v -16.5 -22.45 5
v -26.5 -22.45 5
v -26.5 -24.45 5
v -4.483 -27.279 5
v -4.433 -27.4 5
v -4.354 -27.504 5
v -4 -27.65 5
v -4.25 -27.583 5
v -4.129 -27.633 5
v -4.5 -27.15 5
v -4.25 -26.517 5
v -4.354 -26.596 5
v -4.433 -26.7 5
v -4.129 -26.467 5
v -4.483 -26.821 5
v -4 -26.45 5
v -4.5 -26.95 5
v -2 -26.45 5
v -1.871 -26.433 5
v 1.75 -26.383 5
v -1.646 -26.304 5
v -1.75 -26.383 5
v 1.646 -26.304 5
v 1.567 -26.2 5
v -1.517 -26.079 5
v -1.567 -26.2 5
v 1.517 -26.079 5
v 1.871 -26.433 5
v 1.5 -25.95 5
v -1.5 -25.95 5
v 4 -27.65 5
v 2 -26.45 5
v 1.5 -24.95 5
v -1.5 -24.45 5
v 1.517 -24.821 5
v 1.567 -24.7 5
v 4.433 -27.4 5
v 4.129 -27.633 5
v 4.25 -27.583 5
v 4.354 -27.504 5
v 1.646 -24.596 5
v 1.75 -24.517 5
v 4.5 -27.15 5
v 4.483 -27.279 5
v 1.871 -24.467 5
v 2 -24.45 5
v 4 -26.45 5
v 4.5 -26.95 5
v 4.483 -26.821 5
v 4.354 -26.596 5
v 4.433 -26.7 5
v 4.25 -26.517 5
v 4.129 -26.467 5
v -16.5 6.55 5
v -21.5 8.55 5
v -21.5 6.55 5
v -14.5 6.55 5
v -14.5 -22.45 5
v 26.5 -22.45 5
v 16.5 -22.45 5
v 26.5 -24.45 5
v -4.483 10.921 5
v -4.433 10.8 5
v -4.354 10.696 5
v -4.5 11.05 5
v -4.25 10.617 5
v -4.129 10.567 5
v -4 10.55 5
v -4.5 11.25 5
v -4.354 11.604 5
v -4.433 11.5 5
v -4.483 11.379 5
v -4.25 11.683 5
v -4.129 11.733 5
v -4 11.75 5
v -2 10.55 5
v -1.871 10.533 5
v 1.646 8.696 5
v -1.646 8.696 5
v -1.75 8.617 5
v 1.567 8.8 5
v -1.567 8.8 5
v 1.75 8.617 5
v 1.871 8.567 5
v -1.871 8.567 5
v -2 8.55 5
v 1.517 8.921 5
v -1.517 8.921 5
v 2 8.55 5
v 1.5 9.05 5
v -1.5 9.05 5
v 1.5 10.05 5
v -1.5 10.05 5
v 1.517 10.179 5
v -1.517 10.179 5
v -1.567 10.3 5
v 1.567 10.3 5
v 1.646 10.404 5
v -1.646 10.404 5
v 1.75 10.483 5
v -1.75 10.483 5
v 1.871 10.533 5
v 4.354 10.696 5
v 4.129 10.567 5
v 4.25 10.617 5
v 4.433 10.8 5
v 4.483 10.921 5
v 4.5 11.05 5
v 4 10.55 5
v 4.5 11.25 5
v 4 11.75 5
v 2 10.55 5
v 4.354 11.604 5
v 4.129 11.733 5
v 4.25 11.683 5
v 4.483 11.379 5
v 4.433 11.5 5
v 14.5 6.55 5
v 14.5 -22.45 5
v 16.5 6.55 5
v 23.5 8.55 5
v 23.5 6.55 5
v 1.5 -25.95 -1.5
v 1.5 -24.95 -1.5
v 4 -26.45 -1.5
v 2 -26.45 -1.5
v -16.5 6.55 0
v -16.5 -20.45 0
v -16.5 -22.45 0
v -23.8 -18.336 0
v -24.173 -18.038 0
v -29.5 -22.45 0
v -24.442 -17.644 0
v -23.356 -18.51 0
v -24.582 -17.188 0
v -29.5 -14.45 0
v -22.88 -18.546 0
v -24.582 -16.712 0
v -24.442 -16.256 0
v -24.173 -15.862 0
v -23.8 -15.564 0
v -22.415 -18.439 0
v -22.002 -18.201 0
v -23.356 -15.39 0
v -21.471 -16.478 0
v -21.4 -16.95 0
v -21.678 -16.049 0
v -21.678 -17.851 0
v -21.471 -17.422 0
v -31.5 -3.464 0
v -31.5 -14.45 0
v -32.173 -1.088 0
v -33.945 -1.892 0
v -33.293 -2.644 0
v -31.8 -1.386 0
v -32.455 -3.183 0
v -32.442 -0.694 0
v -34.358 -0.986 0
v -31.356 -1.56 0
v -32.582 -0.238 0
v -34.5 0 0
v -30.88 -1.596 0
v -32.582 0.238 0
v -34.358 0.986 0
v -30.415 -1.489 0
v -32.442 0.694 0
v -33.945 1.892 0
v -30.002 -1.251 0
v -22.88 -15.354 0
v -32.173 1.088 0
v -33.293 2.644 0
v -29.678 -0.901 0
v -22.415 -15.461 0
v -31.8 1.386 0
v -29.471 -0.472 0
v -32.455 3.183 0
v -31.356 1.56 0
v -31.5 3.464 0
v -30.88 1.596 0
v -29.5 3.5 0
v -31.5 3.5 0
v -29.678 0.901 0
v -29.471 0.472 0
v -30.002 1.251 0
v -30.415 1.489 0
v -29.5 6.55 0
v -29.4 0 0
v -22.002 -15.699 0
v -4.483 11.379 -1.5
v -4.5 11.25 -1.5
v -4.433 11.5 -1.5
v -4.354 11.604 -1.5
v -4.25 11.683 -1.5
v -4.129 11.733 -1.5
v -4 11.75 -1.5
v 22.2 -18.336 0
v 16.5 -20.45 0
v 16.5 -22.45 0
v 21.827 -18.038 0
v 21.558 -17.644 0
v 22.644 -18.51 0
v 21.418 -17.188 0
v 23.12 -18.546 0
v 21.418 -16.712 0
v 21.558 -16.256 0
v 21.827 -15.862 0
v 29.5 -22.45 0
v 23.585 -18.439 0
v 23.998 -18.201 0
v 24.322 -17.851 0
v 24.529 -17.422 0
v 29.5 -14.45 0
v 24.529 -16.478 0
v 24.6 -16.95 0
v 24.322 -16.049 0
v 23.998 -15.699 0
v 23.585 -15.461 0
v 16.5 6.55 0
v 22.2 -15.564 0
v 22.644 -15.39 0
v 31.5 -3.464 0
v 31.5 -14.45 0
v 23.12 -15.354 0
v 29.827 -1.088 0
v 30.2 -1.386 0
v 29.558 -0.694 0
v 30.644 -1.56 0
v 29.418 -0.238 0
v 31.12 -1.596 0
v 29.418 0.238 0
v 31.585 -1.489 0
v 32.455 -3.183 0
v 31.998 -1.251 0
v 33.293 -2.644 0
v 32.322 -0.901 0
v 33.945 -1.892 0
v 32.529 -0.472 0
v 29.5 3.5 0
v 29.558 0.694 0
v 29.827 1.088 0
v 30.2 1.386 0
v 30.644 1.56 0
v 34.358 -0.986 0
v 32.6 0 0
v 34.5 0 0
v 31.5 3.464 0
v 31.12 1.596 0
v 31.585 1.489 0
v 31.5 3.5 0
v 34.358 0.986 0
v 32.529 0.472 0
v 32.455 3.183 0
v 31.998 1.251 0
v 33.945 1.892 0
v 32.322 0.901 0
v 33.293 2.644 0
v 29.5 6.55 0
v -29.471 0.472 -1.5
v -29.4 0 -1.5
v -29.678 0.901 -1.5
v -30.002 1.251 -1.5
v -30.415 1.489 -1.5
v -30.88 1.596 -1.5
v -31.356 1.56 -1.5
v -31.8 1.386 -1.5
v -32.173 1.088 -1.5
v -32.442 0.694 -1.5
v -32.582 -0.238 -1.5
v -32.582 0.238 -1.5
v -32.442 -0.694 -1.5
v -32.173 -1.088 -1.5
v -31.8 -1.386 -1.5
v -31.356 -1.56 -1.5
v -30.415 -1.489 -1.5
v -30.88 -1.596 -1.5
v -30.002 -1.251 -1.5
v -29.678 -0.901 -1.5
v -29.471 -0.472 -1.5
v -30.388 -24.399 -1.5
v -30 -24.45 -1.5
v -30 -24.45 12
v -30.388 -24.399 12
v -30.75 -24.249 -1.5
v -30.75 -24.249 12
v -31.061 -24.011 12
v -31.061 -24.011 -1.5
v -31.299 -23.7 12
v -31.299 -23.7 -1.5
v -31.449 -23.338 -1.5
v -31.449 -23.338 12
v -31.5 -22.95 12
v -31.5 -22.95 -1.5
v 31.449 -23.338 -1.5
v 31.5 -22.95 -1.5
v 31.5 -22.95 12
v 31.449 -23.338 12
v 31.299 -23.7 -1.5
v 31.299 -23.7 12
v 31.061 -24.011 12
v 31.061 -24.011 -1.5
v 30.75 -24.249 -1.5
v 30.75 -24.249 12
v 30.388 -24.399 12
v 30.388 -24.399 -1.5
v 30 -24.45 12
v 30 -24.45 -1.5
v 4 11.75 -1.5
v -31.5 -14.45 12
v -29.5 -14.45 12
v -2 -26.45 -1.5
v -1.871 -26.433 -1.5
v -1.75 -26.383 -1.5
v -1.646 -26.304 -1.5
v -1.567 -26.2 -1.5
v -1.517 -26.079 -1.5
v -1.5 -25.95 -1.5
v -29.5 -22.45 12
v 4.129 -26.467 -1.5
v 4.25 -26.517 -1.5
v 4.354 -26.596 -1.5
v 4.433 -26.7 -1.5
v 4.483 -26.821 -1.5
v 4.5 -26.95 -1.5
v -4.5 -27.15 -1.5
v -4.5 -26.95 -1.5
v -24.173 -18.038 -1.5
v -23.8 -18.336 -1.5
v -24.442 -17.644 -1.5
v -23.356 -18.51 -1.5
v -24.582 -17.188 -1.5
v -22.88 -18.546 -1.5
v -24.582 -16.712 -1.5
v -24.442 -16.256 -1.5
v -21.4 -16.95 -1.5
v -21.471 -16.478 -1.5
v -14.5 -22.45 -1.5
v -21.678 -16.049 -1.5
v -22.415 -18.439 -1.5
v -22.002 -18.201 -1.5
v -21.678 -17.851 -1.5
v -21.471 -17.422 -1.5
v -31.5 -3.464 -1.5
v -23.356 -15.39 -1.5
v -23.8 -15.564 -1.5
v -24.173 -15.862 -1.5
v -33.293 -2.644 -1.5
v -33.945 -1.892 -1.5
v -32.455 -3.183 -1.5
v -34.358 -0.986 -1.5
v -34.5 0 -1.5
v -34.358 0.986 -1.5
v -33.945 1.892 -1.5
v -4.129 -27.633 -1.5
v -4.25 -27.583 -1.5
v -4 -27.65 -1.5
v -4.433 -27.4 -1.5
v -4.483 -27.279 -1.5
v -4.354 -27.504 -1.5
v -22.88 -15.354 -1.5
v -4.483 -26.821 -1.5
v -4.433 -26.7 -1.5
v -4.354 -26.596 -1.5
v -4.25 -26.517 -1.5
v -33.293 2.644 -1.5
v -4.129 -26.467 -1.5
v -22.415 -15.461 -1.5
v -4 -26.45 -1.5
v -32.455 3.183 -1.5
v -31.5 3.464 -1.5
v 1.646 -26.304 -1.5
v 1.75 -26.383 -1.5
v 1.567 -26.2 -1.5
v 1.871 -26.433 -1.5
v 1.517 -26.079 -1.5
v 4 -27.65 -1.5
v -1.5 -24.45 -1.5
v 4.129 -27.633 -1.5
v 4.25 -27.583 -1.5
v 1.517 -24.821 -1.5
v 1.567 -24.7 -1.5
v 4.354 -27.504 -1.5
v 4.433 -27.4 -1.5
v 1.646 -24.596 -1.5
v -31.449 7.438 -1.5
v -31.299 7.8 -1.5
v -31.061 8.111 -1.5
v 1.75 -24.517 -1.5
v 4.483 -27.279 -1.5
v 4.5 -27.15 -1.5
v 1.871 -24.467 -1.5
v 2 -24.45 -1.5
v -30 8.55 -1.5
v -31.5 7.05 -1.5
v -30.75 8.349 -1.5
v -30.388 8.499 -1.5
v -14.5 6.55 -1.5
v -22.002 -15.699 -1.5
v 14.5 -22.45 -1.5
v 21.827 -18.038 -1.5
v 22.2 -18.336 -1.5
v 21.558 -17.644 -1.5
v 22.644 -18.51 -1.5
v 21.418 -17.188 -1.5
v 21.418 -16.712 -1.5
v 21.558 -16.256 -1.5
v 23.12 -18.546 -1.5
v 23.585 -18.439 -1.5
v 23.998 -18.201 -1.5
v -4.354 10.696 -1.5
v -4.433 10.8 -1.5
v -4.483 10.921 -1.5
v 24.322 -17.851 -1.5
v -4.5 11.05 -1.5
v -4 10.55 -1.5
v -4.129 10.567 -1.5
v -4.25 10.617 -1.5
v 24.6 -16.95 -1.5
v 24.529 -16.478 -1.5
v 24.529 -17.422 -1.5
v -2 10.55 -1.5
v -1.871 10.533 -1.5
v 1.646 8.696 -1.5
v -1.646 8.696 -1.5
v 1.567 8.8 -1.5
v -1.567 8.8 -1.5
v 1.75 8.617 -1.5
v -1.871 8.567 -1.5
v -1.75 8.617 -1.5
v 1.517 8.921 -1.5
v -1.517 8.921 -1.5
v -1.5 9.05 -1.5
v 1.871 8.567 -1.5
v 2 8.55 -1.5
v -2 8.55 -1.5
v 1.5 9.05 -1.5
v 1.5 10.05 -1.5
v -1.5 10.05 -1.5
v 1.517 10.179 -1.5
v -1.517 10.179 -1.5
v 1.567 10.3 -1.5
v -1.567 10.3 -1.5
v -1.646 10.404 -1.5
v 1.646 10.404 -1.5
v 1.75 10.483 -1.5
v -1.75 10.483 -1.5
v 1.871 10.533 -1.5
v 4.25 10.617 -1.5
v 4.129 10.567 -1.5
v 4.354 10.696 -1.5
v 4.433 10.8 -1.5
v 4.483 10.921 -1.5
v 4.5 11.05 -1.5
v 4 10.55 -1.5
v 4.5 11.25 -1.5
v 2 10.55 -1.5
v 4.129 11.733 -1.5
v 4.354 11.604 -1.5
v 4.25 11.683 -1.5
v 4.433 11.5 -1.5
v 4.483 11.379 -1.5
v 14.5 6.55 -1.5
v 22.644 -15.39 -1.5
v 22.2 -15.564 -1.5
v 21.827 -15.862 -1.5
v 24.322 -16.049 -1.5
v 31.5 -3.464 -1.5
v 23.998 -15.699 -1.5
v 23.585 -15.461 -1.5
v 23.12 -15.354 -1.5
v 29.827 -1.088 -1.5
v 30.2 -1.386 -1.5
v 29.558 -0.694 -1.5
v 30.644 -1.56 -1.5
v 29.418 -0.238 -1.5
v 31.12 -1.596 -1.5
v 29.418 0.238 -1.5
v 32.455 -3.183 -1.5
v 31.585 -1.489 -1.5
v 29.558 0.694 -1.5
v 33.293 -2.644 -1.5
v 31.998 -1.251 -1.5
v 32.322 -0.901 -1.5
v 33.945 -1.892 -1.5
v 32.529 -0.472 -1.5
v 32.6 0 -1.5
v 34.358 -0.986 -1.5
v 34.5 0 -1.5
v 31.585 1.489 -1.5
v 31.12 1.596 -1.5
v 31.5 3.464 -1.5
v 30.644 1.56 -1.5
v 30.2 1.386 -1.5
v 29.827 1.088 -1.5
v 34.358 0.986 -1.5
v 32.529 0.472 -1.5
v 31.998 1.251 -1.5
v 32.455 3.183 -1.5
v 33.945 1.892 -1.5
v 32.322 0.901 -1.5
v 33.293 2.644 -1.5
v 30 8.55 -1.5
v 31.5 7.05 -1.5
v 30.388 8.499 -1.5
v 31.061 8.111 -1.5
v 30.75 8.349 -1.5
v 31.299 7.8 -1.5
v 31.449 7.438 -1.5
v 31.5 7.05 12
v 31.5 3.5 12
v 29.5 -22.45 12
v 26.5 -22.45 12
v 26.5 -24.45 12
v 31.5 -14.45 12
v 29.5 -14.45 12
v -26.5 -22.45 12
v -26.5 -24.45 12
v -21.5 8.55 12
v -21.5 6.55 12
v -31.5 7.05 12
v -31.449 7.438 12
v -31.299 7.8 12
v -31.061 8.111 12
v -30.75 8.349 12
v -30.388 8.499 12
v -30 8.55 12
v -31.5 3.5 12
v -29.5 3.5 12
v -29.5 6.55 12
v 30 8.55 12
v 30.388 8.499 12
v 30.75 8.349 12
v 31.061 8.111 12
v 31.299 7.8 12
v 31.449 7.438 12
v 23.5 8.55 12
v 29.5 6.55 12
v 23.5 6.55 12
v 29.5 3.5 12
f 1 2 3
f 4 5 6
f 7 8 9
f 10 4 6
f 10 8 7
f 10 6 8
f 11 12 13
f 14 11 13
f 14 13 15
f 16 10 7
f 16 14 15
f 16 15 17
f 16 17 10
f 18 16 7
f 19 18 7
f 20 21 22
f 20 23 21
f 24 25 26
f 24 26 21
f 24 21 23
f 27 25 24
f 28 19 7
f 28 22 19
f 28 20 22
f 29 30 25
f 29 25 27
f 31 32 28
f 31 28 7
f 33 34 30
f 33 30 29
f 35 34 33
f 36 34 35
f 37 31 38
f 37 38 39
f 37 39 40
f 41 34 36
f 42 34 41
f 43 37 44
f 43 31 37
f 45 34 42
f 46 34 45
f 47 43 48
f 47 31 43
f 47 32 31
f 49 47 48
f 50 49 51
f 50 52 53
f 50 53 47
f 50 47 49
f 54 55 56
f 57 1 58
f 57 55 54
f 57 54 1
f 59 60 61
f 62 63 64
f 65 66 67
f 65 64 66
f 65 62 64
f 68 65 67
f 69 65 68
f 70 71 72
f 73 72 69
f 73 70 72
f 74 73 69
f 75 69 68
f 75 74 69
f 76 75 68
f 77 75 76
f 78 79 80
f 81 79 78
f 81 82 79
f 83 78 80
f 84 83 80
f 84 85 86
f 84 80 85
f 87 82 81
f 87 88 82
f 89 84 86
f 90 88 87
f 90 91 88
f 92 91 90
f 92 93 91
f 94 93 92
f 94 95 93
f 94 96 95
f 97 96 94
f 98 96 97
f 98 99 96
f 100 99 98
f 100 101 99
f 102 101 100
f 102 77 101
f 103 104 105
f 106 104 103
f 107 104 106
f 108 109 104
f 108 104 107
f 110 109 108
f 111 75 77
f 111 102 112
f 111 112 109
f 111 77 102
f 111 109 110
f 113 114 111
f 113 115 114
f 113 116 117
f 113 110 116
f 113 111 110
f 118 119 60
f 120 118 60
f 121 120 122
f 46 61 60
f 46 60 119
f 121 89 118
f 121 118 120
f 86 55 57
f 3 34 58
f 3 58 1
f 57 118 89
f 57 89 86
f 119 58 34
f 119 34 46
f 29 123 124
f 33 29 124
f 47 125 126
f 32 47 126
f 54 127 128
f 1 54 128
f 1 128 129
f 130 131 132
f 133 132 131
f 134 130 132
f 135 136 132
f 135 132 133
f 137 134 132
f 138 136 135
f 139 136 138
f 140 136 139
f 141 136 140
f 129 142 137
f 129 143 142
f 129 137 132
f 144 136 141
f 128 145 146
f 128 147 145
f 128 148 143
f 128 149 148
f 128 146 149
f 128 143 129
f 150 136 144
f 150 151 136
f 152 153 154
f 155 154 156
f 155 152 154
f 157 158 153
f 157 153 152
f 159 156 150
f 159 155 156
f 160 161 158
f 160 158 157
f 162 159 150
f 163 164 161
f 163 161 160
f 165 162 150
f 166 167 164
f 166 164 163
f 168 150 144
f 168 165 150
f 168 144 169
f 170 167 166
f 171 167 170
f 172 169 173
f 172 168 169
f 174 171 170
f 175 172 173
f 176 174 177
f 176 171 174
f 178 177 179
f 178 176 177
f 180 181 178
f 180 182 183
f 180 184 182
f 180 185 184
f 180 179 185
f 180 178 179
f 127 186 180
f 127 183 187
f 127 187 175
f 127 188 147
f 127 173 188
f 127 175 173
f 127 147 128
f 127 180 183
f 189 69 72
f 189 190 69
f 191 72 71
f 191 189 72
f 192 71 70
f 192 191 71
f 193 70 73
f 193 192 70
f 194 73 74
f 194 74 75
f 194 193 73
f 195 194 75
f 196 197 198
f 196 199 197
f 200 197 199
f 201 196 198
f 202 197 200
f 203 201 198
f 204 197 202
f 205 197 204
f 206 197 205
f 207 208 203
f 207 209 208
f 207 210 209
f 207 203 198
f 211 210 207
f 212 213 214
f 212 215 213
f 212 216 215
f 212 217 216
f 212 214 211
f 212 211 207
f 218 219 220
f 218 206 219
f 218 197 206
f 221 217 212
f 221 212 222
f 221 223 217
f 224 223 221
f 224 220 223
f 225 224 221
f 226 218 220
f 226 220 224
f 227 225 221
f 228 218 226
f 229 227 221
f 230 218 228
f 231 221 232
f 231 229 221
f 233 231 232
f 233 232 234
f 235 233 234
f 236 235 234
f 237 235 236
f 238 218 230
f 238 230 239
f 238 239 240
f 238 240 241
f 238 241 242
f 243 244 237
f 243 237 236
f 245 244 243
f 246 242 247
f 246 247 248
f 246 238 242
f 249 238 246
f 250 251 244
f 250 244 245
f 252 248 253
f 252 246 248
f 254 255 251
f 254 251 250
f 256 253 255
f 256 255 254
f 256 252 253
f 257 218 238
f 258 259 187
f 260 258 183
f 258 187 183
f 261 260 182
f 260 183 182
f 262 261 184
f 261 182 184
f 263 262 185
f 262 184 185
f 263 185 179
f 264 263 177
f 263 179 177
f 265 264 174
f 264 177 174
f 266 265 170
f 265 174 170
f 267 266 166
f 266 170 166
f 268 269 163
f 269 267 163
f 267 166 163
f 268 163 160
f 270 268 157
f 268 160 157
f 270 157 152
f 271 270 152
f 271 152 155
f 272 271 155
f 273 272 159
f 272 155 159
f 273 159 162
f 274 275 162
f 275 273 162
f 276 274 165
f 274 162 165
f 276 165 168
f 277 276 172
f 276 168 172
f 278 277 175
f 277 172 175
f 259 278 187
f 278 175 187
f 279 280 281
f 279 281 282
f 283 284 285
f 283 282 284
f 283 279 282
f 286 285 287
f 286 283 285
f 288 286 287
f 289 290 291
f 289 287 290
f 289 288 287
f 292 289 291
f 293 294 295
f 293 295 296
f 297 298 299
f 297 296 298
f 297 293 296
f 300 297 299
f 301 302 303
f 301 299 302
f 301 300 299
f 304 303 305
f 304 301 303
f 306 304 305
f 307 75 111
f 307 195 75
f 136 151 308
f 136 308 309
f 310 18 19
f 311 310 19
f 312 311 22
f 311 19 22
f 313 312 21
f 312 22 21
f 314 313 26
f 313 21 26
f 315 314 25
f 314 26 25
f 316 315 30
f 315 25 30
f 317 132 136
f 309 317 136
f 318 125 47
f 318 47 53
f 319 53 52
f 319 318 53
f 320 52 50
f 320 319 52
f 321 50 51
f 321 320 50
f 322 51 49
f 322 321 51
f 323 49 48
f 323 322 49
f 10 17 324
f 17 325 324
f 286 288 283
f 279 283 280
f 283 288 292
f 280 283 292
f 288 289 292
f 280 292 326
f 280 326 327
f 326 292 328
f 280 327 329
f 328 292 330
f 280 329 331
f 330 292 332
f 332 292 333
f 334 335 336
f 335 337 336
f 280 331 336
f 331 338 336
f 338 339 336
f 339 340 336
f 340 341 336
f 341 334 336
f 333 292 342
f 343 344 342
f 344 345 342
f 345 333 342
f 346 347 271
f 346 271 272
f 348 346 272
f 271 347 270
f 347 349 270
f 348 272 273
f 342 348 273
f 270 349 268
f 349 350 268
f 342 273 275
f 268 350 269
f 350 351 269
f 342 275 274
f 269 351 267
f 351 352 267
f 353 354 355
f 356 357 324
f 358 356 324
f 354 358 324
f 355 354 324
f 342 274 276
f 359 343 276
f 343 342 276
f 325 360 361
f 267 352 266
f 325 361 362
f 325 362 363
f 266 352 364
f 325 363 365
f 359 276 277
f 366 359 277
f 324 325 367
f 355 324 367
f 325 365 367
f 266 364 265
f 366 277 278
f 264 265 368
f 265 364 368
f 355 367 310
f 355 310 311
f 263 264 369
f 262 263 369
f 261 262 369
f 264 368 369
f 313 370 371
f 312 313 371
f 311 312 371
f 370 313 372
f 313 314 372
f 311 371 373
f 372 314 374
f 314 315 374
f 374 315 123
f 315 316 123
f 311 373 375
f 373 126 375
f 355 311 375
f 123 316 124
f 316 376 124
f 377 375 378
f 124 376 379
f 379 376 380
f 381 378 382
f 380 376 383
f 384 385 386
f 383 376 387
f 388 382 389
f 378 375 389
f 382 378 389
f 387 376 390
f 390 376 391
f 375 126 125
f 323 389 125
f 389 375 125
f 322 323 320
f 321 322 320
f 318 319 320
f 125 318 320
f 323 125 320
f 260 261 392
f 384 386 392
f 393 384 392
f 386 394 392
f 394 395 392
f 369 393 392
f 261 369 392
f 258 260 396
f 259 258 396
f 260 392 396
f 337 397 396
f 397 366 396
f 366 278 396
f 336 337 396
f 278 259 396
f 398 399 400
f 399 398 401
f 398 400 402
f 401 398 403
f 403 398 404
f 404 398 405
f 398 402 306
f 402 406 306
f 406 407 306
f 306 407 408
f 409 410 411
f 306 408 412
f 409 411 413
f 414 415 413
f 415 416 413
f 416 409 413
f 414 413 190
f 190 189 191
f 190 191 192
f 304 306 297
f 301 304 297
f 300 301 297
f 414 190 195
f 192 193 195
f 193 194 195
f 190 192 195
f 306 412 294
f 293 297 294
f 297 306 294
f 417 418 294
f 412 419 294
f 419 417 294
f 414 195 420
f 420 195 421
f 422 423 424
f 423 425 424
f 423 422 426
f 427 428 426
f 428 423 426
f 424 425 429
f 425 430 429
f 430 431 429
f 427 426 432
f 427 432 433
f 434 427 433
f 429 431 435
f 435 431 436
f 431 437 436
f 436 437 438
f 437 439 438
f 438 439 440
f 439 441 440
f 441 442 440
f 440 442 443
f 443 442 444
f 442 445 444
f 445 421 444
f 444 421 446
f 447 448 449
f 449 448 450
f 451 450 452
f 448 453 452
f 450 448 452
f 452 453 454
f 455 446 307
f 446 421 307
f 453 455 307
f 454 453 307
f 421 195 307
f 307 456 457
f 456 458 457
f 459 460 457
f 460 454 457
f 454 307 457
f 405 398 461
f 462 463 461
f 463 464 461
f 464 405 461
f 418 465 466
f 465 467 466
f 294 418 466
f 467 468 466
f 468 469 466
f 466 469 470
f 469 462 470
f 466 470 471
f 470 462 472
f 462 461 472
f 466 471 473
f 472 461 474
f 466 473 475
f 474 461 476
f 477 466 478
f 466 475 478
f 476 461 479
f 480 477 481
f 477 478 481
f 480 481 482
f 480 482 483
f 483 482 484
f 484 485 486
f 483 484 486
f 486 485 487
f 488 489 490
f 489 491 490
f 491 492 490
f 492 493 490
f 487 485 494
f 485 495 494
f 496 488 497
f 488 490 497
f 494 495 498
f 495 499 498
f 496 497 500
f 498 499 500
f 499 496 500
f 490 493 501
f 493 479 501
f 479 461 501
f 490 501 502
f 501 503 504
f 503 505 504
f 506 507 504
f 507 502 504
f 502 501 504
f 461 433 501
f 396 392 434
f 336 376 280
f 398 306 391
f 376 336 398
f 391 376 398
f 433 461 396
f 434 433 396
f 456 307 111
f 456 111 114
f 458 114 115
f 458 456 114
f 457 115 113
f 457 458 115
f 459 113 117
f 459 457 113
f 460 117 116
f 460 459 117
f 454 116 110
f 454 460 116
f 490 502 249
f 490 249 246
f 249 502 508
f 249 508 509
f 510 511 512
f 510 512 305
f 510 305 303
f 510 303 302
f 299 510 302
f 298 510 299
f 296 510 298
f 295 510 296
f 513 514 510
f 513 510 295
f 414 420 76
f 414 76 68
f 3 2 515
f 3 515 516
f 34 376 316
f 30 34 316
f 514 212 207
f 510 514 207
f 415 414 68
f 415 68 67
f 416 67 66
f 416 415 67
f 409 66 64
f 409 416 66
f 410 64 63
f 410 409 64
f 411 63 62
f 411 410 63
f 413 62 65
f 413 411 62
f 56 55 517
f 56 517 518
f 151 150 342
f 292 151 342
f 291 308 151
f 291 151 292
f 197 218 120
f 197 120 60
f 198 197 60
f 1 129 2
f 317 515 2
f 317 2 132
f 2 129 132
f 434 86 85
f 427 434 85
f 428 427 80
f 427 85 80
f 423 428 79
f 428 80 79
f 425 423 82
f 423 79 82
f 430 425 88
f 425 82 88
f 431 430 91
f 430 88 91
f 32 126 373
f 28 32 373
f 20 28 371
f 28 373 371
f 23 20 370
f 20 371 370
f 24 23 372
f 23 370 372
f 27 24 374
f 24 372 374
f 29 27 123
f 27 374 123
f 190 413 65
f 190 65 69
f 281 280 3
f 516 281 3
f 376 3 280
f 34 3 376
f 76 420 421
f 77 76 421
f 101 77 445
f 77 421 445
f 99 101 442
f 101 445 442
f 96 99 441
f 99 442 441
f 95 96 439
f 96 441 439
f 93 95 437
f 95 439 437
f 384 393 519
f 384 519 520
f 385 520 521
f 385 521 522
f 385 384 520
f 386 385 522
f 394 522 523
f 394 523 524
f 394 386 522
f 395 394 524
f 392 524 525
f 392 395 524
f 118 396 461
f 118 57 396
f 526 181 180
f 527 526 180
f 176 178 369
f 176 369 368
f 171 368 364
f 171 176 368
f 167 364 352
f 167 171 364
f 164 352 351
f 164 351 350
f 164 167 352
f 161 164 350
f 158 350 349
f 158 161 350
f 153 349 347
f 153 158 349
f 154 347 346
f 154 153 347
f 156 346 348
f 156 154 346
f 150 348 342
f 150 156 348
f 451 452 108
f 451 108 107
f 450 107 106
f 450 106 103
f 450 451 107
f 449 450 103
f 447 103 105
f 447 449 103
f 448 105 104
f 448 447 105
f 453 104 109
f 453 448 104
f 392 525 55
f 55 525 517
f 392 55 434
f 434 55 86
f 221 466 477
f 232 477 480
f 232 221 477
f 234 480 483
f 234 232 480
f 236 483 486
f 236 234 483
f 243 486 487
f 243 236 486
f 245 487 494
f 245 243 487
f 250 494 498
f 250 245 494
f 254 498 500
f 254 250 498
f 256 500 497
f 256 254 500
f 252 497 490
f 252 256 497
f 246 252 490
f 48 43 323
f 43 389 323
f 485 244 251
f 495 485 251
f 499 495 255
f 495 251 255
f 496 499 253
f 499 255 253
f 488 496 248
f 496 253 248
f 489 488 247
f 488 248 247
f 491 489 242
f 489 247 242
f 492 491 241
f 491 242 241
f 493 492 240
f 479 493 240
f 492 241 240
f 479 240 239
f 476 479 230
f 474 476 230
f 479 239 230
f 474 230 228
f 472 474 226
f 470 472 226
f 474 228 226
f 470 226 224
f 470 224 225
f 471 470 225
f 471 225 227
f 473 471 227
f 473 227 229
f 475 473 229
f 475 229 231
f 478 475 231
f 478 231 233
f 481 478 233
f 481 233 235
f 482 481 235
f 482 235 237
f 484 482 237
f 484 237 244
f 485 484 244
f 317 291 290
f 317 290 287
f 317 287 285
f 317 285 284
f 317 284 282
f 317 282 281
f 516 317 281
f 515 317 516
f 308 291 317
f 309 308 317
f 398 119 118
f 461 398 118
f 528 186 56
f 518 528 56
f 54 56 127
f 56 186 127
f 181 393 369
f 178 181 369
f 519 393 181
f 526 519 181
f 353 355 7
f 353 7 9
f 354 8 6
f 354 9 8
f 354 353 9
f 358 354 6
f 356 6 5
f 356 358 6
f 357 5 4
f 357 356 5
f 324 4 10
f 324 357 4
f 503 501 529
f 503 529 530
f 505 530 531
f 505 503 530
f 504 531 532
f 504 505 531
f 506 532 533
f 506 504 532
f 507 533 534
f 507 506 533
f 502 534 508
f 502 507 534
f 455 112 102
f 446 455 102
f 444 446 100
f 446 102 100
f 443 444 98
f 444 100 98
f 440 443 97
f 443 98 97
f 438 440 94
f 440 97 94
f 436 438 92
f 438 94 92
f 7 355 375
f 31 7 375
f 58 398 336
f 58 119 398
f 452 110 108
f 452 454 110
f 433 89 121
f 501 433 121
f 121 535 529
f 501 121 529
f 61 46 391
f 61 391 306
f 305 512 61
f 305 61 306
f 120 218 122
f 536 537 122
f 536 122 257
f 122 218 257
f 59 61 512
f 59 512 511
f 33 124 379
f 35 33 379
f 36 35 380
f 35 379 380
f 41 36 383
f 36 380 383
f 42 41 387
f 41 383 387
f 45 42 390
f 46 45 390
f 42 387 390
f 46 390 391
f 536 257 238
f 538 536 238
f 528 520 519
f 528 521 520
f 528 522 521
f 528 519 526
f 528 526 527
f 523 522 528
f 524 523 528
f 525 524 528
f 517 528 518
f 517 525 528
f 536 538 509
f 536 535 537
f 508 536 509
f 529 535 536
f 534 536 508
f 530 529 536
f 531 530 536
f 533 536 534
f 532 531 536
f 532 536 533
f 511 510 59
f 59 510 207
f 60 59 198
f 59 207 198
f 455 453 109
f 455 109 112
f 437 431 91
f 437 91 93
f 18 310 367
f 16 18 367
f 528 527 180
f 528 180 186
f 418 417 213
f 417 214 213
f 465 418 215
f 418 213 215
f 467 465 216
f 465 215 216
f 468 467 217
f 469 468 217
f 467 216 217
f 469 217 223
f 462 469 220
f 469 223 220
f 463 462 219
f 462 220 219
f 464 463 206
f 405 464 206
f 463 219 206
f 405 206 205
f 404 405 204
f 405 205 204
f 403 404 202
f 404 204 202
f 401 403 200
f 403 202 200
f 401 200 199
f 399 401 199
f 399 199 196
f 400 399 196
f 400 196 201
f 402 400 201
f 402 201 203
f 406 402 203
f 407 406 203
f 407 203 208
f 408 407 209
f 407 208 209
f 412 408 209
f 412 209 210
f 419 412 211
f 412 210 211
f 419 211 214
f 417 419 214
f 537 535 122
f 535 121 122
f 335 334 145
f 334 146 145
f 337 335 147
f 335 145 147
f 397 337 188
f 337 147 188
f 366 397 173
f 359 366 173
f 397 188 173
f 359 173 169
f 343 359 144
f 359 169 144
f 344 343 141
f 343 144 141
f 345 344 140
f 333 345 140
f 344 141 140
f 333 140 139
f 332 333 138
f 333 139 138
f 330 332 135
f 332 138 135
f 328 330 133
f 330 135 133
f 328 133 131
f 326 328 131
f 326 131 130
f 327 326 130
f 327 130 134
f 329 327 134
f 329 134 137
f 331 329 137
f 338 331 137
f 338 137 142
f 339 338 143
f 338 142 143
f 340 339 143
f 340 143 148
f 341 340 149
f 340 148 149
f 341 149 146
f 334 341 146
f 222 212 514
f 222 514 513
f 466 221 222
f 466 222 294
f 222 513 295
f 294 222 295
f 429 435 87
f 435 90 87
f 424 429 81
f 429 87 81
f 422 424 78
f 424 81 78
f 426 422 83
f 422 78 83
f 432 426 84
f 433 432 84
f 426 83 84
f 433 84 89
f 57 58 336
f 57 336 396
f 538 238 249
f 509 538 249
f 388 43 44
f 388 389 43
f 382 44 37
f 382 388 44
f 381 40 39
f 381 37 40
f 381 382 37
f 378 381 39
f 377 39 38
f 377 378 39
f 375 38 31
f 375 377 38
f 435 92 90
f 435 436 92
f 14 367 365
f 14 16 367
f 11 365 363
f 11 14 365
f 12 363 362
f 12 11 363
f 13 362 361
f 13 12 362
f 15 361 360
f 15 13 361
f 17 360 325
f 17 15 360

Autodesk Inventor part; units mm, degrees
ref_plane "YZ Plane" through (0, 0, 0) normal (1, 0, 0) x (0, 1, 0)
ref_plane "XZ Plane" through (0, 0, 0) normal (0, 1, 0) x (-1, 0, 0)
ref_plane "XY Plane" through (0, 0, 0) normal (0, 0, 1) x (1, 0, 0)
sketch "スケッチ1" plane through (0, 0, 0) normal (0, 0, 1) x (1, 0, 0)
  line L0 (-44.3295, 0) -> (44.3295, 0) construction
  line L1 (0, 23.7122) -> (0, -23.7122) construction
  line L2 (-26.6016, -16.95) -> (26.6016, -16.95) construction
  line L3 (-23, 17.7575) -> (-23, -30.8175) construction
  line L4 (23, -30.8175) -> (23, 17.7575) construction
  line L5 (-31, 17.7575) -> (-31, -30.8175) construction
  line L6 (31, -30.8175) -> (31, 17.7575) construction
  circle A0 centre (-31, 0) radius 1.6
  circle A1 centre (-23, -16.95) radius 1.6
  circle A2 centre (23, -16.95) radius 1.6
  circle A3 centre (31, 0) radius 1.6
  line L7 (-29.5, 6.55) -> (29.5, 6.55)
  line L8 (29.5, 6.55) -> (29.5, -22.45)
  line L9 (29.5, -22.45) -> (-29.5, -22.45)
  line L10 (-29.5, -22.45) -> (-29.5, 6.55)
  circle A4 centre (-23, -16.95) radius 3.5
  circle A5 centre (-31, 0) radius 3.5
  circle A6 centre (23, -16.95) radius 3.5
  circle A7 centre (31, 0) radius 3.5
  line L11 (-31.5, 8.55) -> (31.5, 8.55)
  line L12 (-31.5, 8.55) -> (-31.5, -24.45)
  line L13 (31.5, 8.55) -> (31.5, -24.45)
  line L14 (-31.5, -24.45) -> (31.5, -24.45)
  line L15 (-23, -20.45) -> (23, -20.45)
  line L16 (-26.5, -22.45) -> (-26.5, -24.45)
  line L17 (26.5, -24.45) -> (26.5, -22.45)
  line L18 (-31.5, -14.45) -> (-29.5, -14.45)
  line L19 (-31.5, 3.5) -> (-29.5, 3.5)
  line L20 (29.5, 3.5) -> (31.5, 3.5)
  line L21 (29.5, -14.45) -> (31.5, -14.45)
  line L22 (-21.5, 8.55) -> (-21.5, 6.55)
  line L23 (23.5, 8.55) -> (23.5, 6.55)
  line L24 (-16.5, 8.55) -> (-16.5, -24.45)
  line L25 (-14.5, -24.45) -> (-14.5, 8.55)
  line L26 (16.5, 8.55) -> (16.5, -24.45)
  line L27 (14.5, -24.45) -> (14.5, 8.55)
  line L28 (-40.1456, -7.95) -> (40.1456, -7.95) construction
  line L29 (-1.5, 8.55) -> (-1.5, 10.55)
  line L30 (-1.5, 10.55) -> (-4.5, 10.55)
  line L31 (-4.5, 10.55) -> (-4.5, 11.75)
  line L32 (-4.5, 11.75) -> (4.5, 11.75)
  line L33 (4.5, 11.75) -> (4.5, 10.55)
  line L34 (4.5, 10.55) -> (1.5, 10.55)
  line L35 (1.5, 10.55) -> (1.5, 8.55)
  line L36 (-1.5, -24.45) -> (-1.5, -26.45)
  line L37 (-1.5, -26.45) -> (-4.5, -26.45)
  line L38 (-4.5, -26.45) -> (-4.5, -27.65)
  line L39 (-4.5, -27.65) -> (4.5, -27.65)
  line L40 (4.5, -27.65) -> (4.5, -26.45)
  line L41 (4.5, -26.45) -> (1.5, -26.45)
  line L42 (1.5, -26.45) -> (1.5, -24.45)
  point P0 (0, 0)
  point P1 (0, 0)
  point P2 (0, -16.95)
  point P3 (0, -22.45)
  point P4 (-31.5, 3.4641)
  point P5 (-31.5, -3.4641)
  point P6 (-26.3541, -17.95)
  point P7 (26.3541, -17.95)
  point P8 (31.5, -3.4641)
  point P9 (31.5, 3.4641)
  point P10 (29.5, -3.1623)
  point P11 (25.8723, -14.95)
  point P12 (-19.6459, -17.95)
  point P13 (19.6459, -17.95)
  point P14 (20.1277, -14.95)
  point P15 (-20.1277, -14.95)
  point P16 (-25.8723, -14.95)
  point P17 (-29.5, -3.1623)
  point P18 (29.5, 3.1623)
  point P19 (-29.5, 3.1623)
  point P20 (0, -7.95)
  point P21 (16.5, -22.45)
  point P22 (14.5, -22.45)
  point P23 (-14.5, -22.45)
  point P24 (-16.5, -22.45)
  point P25 (16.5, 6.55)
  point P26 (14.5, 6.55)
  point P27 (-14.5, 6.55)
  point P28 (-16.5, 6.55)
  point P29 (14.5, -20.45)
  point P30 (-14.5, -20.45)
  dimension "MOUNT_W" = 16.95
  dimension "d1" = 23
  dimension "d2" = 31
  dimension "d3" = 3.2
  dimension "d4" = 59
  dimension "d5" = 29
  dimension "d8" = 7
  dimension "d9" = 2
  dimension "d10" = 2
  dimension "d11" = 2
  dimension "d12" = 2
  dimension "d18" = 8
  dimension "d19" = 8
  dimension "d20" = 8
  dimension "d24" = 2
  dimension "d25" = 2
  dimension "d26" = 2
  dimension "d27" = 13
  dimension "d28" = 13
  dimension "d33" = 3
  dimension "d34" = 9
  dimension "d35" = 2
  dimension "d36" = 1.2
extrude "ベース" add sketch "スケッチ1" against normal blind 1.5 contours A0 L10 A5 | A0 L12 A5 L10 | L10 A5 L12 A0 | A0 L12 A5 | A5 L19 L10 | A4 | L10 L7 L24 L9 A5 | L10 L18 L12 A5 | L12 L19 A5 | L19 L12 L11 L22 L7 L10 | L10 L9 L16 L14 L12 L18 | L22 L11 L24 L7 | L9 L24 L14 L16 | L24 L11 L25 L7 | L7 L25 L15 L24 | L24 L15 L25 L9 | L9 L25 L14 L24 | L25 L11 L27 L7 | L7 L27 L15 L25 | L25 L15 L27 L9 | L9 L27 L14 L25 | L27 L11 L26 L7 | L7 L26 L15 L27 | L27 L15 L26 L9 | L9 L26 L14 L27 | L26 L11 L23 L7 | A6 | L7 L8 A7 L9 L26 | L9 L17 L14 L26 | L23 L11 L13 L20 L8 L7 | L9 L8 L21 L13 L14 L17 | L20 A7 L8 | L8 A7 L13 L21 | A7 L13 A3 L8 | L8 A3 A7 | L20 L13 A7 | L8 A3 L13 A7 | A7 L13 A3
extrude "囲い柱" add sketch "スケッチ1" along normal blind 12 contours L19 L12 L11 L22 L7 L10 | L10 L9 L16 L14 L12 L18 | L23 L11 L13 L20 L8 L7 | L9 L8 L21 L13 L14 L17
extrude "底上げ" add sketch "スケッチ1" along normal blind 5 contours L22 L11 L24 L7 | L9 L24 L14 L16 | L24 L11 L25 L7 | L7 L25 L15 L24 | L24 L15 L25 L9 | L9 L25 L14 L24 | L25 L11 L27 L7 | L9 L27 L14 L25 | L27 L11 L26 L7 | L7 L26 L15 L27 | L27 L15 L26 L9 | L9 L26 L14 L27 | L26 L11 L23 L7 | L9 L17 L14 L26
extrude "肉抜き" cut sketch "スケッチ1" against normal through all contours L7 L27 L15 L25 | L25 L15 L27 L9
extrude "輪ゴムタブ" add sketch "スケッチ1" along normal blind 5 and the other way blind 1.5 contours L29 L30 L31 L32 L33 L34 L35 L11 | L14 L42 L41 L40 L39 L38 L37 L36
fillet "フィレット1" radius 1.5 4 edges at (-31.5, 8.55, 5.25) (31.5, 8.55, 5.25) (-31.5, -24.45, 5.25) (31.5, -24.45, 5.25)
fillet "フィレット2" radius 0.5 15 edges at (-4.5, 11.75, 1.75) (-4.5, 10.55, 1.75) (4.5, 10.55, 1.75) (4.5, 11.75, 1.75) (1.5, 10.55, 1.75) (1.5, 8.55, 1.75) (-1.5, 10.55, 1.75) (-1.5, 8.55, 1.75) (-1.5, -26.45, 1.75) (-4.5, -26.45, 1.75) (-4.5, -27.65, 1.75) (4.5, -26.45, 1.75) (1.5, -24.45, 1.75) (4.5, -27.65, 1.75) (1.5, -26.45, 1.75)
equation "\"d5\" = BAT_W + CLEARANCE"
equation "\"d9\" = TAB_W"
equation "\"d10\" = d9"
equation "\"d11\" = d9"
equation "\"d12\" = d9"
equation "\"d18\" = d19"
equation "\"d20\" = d19"
equation "\"d26\" = d25"
equation "\"d28\" = d27"
equation "\"d22\" = TAB_H"
equation "\"BAT_L\" = 58"
equation "\"BAT_W\" = 28"
equation "\"CLEARANCE\" = 1"
equation "\"TAB_W\" = 2"
equation "\"TAB_H\" = 12"
properties part number "Battery-Holder-2x2"
